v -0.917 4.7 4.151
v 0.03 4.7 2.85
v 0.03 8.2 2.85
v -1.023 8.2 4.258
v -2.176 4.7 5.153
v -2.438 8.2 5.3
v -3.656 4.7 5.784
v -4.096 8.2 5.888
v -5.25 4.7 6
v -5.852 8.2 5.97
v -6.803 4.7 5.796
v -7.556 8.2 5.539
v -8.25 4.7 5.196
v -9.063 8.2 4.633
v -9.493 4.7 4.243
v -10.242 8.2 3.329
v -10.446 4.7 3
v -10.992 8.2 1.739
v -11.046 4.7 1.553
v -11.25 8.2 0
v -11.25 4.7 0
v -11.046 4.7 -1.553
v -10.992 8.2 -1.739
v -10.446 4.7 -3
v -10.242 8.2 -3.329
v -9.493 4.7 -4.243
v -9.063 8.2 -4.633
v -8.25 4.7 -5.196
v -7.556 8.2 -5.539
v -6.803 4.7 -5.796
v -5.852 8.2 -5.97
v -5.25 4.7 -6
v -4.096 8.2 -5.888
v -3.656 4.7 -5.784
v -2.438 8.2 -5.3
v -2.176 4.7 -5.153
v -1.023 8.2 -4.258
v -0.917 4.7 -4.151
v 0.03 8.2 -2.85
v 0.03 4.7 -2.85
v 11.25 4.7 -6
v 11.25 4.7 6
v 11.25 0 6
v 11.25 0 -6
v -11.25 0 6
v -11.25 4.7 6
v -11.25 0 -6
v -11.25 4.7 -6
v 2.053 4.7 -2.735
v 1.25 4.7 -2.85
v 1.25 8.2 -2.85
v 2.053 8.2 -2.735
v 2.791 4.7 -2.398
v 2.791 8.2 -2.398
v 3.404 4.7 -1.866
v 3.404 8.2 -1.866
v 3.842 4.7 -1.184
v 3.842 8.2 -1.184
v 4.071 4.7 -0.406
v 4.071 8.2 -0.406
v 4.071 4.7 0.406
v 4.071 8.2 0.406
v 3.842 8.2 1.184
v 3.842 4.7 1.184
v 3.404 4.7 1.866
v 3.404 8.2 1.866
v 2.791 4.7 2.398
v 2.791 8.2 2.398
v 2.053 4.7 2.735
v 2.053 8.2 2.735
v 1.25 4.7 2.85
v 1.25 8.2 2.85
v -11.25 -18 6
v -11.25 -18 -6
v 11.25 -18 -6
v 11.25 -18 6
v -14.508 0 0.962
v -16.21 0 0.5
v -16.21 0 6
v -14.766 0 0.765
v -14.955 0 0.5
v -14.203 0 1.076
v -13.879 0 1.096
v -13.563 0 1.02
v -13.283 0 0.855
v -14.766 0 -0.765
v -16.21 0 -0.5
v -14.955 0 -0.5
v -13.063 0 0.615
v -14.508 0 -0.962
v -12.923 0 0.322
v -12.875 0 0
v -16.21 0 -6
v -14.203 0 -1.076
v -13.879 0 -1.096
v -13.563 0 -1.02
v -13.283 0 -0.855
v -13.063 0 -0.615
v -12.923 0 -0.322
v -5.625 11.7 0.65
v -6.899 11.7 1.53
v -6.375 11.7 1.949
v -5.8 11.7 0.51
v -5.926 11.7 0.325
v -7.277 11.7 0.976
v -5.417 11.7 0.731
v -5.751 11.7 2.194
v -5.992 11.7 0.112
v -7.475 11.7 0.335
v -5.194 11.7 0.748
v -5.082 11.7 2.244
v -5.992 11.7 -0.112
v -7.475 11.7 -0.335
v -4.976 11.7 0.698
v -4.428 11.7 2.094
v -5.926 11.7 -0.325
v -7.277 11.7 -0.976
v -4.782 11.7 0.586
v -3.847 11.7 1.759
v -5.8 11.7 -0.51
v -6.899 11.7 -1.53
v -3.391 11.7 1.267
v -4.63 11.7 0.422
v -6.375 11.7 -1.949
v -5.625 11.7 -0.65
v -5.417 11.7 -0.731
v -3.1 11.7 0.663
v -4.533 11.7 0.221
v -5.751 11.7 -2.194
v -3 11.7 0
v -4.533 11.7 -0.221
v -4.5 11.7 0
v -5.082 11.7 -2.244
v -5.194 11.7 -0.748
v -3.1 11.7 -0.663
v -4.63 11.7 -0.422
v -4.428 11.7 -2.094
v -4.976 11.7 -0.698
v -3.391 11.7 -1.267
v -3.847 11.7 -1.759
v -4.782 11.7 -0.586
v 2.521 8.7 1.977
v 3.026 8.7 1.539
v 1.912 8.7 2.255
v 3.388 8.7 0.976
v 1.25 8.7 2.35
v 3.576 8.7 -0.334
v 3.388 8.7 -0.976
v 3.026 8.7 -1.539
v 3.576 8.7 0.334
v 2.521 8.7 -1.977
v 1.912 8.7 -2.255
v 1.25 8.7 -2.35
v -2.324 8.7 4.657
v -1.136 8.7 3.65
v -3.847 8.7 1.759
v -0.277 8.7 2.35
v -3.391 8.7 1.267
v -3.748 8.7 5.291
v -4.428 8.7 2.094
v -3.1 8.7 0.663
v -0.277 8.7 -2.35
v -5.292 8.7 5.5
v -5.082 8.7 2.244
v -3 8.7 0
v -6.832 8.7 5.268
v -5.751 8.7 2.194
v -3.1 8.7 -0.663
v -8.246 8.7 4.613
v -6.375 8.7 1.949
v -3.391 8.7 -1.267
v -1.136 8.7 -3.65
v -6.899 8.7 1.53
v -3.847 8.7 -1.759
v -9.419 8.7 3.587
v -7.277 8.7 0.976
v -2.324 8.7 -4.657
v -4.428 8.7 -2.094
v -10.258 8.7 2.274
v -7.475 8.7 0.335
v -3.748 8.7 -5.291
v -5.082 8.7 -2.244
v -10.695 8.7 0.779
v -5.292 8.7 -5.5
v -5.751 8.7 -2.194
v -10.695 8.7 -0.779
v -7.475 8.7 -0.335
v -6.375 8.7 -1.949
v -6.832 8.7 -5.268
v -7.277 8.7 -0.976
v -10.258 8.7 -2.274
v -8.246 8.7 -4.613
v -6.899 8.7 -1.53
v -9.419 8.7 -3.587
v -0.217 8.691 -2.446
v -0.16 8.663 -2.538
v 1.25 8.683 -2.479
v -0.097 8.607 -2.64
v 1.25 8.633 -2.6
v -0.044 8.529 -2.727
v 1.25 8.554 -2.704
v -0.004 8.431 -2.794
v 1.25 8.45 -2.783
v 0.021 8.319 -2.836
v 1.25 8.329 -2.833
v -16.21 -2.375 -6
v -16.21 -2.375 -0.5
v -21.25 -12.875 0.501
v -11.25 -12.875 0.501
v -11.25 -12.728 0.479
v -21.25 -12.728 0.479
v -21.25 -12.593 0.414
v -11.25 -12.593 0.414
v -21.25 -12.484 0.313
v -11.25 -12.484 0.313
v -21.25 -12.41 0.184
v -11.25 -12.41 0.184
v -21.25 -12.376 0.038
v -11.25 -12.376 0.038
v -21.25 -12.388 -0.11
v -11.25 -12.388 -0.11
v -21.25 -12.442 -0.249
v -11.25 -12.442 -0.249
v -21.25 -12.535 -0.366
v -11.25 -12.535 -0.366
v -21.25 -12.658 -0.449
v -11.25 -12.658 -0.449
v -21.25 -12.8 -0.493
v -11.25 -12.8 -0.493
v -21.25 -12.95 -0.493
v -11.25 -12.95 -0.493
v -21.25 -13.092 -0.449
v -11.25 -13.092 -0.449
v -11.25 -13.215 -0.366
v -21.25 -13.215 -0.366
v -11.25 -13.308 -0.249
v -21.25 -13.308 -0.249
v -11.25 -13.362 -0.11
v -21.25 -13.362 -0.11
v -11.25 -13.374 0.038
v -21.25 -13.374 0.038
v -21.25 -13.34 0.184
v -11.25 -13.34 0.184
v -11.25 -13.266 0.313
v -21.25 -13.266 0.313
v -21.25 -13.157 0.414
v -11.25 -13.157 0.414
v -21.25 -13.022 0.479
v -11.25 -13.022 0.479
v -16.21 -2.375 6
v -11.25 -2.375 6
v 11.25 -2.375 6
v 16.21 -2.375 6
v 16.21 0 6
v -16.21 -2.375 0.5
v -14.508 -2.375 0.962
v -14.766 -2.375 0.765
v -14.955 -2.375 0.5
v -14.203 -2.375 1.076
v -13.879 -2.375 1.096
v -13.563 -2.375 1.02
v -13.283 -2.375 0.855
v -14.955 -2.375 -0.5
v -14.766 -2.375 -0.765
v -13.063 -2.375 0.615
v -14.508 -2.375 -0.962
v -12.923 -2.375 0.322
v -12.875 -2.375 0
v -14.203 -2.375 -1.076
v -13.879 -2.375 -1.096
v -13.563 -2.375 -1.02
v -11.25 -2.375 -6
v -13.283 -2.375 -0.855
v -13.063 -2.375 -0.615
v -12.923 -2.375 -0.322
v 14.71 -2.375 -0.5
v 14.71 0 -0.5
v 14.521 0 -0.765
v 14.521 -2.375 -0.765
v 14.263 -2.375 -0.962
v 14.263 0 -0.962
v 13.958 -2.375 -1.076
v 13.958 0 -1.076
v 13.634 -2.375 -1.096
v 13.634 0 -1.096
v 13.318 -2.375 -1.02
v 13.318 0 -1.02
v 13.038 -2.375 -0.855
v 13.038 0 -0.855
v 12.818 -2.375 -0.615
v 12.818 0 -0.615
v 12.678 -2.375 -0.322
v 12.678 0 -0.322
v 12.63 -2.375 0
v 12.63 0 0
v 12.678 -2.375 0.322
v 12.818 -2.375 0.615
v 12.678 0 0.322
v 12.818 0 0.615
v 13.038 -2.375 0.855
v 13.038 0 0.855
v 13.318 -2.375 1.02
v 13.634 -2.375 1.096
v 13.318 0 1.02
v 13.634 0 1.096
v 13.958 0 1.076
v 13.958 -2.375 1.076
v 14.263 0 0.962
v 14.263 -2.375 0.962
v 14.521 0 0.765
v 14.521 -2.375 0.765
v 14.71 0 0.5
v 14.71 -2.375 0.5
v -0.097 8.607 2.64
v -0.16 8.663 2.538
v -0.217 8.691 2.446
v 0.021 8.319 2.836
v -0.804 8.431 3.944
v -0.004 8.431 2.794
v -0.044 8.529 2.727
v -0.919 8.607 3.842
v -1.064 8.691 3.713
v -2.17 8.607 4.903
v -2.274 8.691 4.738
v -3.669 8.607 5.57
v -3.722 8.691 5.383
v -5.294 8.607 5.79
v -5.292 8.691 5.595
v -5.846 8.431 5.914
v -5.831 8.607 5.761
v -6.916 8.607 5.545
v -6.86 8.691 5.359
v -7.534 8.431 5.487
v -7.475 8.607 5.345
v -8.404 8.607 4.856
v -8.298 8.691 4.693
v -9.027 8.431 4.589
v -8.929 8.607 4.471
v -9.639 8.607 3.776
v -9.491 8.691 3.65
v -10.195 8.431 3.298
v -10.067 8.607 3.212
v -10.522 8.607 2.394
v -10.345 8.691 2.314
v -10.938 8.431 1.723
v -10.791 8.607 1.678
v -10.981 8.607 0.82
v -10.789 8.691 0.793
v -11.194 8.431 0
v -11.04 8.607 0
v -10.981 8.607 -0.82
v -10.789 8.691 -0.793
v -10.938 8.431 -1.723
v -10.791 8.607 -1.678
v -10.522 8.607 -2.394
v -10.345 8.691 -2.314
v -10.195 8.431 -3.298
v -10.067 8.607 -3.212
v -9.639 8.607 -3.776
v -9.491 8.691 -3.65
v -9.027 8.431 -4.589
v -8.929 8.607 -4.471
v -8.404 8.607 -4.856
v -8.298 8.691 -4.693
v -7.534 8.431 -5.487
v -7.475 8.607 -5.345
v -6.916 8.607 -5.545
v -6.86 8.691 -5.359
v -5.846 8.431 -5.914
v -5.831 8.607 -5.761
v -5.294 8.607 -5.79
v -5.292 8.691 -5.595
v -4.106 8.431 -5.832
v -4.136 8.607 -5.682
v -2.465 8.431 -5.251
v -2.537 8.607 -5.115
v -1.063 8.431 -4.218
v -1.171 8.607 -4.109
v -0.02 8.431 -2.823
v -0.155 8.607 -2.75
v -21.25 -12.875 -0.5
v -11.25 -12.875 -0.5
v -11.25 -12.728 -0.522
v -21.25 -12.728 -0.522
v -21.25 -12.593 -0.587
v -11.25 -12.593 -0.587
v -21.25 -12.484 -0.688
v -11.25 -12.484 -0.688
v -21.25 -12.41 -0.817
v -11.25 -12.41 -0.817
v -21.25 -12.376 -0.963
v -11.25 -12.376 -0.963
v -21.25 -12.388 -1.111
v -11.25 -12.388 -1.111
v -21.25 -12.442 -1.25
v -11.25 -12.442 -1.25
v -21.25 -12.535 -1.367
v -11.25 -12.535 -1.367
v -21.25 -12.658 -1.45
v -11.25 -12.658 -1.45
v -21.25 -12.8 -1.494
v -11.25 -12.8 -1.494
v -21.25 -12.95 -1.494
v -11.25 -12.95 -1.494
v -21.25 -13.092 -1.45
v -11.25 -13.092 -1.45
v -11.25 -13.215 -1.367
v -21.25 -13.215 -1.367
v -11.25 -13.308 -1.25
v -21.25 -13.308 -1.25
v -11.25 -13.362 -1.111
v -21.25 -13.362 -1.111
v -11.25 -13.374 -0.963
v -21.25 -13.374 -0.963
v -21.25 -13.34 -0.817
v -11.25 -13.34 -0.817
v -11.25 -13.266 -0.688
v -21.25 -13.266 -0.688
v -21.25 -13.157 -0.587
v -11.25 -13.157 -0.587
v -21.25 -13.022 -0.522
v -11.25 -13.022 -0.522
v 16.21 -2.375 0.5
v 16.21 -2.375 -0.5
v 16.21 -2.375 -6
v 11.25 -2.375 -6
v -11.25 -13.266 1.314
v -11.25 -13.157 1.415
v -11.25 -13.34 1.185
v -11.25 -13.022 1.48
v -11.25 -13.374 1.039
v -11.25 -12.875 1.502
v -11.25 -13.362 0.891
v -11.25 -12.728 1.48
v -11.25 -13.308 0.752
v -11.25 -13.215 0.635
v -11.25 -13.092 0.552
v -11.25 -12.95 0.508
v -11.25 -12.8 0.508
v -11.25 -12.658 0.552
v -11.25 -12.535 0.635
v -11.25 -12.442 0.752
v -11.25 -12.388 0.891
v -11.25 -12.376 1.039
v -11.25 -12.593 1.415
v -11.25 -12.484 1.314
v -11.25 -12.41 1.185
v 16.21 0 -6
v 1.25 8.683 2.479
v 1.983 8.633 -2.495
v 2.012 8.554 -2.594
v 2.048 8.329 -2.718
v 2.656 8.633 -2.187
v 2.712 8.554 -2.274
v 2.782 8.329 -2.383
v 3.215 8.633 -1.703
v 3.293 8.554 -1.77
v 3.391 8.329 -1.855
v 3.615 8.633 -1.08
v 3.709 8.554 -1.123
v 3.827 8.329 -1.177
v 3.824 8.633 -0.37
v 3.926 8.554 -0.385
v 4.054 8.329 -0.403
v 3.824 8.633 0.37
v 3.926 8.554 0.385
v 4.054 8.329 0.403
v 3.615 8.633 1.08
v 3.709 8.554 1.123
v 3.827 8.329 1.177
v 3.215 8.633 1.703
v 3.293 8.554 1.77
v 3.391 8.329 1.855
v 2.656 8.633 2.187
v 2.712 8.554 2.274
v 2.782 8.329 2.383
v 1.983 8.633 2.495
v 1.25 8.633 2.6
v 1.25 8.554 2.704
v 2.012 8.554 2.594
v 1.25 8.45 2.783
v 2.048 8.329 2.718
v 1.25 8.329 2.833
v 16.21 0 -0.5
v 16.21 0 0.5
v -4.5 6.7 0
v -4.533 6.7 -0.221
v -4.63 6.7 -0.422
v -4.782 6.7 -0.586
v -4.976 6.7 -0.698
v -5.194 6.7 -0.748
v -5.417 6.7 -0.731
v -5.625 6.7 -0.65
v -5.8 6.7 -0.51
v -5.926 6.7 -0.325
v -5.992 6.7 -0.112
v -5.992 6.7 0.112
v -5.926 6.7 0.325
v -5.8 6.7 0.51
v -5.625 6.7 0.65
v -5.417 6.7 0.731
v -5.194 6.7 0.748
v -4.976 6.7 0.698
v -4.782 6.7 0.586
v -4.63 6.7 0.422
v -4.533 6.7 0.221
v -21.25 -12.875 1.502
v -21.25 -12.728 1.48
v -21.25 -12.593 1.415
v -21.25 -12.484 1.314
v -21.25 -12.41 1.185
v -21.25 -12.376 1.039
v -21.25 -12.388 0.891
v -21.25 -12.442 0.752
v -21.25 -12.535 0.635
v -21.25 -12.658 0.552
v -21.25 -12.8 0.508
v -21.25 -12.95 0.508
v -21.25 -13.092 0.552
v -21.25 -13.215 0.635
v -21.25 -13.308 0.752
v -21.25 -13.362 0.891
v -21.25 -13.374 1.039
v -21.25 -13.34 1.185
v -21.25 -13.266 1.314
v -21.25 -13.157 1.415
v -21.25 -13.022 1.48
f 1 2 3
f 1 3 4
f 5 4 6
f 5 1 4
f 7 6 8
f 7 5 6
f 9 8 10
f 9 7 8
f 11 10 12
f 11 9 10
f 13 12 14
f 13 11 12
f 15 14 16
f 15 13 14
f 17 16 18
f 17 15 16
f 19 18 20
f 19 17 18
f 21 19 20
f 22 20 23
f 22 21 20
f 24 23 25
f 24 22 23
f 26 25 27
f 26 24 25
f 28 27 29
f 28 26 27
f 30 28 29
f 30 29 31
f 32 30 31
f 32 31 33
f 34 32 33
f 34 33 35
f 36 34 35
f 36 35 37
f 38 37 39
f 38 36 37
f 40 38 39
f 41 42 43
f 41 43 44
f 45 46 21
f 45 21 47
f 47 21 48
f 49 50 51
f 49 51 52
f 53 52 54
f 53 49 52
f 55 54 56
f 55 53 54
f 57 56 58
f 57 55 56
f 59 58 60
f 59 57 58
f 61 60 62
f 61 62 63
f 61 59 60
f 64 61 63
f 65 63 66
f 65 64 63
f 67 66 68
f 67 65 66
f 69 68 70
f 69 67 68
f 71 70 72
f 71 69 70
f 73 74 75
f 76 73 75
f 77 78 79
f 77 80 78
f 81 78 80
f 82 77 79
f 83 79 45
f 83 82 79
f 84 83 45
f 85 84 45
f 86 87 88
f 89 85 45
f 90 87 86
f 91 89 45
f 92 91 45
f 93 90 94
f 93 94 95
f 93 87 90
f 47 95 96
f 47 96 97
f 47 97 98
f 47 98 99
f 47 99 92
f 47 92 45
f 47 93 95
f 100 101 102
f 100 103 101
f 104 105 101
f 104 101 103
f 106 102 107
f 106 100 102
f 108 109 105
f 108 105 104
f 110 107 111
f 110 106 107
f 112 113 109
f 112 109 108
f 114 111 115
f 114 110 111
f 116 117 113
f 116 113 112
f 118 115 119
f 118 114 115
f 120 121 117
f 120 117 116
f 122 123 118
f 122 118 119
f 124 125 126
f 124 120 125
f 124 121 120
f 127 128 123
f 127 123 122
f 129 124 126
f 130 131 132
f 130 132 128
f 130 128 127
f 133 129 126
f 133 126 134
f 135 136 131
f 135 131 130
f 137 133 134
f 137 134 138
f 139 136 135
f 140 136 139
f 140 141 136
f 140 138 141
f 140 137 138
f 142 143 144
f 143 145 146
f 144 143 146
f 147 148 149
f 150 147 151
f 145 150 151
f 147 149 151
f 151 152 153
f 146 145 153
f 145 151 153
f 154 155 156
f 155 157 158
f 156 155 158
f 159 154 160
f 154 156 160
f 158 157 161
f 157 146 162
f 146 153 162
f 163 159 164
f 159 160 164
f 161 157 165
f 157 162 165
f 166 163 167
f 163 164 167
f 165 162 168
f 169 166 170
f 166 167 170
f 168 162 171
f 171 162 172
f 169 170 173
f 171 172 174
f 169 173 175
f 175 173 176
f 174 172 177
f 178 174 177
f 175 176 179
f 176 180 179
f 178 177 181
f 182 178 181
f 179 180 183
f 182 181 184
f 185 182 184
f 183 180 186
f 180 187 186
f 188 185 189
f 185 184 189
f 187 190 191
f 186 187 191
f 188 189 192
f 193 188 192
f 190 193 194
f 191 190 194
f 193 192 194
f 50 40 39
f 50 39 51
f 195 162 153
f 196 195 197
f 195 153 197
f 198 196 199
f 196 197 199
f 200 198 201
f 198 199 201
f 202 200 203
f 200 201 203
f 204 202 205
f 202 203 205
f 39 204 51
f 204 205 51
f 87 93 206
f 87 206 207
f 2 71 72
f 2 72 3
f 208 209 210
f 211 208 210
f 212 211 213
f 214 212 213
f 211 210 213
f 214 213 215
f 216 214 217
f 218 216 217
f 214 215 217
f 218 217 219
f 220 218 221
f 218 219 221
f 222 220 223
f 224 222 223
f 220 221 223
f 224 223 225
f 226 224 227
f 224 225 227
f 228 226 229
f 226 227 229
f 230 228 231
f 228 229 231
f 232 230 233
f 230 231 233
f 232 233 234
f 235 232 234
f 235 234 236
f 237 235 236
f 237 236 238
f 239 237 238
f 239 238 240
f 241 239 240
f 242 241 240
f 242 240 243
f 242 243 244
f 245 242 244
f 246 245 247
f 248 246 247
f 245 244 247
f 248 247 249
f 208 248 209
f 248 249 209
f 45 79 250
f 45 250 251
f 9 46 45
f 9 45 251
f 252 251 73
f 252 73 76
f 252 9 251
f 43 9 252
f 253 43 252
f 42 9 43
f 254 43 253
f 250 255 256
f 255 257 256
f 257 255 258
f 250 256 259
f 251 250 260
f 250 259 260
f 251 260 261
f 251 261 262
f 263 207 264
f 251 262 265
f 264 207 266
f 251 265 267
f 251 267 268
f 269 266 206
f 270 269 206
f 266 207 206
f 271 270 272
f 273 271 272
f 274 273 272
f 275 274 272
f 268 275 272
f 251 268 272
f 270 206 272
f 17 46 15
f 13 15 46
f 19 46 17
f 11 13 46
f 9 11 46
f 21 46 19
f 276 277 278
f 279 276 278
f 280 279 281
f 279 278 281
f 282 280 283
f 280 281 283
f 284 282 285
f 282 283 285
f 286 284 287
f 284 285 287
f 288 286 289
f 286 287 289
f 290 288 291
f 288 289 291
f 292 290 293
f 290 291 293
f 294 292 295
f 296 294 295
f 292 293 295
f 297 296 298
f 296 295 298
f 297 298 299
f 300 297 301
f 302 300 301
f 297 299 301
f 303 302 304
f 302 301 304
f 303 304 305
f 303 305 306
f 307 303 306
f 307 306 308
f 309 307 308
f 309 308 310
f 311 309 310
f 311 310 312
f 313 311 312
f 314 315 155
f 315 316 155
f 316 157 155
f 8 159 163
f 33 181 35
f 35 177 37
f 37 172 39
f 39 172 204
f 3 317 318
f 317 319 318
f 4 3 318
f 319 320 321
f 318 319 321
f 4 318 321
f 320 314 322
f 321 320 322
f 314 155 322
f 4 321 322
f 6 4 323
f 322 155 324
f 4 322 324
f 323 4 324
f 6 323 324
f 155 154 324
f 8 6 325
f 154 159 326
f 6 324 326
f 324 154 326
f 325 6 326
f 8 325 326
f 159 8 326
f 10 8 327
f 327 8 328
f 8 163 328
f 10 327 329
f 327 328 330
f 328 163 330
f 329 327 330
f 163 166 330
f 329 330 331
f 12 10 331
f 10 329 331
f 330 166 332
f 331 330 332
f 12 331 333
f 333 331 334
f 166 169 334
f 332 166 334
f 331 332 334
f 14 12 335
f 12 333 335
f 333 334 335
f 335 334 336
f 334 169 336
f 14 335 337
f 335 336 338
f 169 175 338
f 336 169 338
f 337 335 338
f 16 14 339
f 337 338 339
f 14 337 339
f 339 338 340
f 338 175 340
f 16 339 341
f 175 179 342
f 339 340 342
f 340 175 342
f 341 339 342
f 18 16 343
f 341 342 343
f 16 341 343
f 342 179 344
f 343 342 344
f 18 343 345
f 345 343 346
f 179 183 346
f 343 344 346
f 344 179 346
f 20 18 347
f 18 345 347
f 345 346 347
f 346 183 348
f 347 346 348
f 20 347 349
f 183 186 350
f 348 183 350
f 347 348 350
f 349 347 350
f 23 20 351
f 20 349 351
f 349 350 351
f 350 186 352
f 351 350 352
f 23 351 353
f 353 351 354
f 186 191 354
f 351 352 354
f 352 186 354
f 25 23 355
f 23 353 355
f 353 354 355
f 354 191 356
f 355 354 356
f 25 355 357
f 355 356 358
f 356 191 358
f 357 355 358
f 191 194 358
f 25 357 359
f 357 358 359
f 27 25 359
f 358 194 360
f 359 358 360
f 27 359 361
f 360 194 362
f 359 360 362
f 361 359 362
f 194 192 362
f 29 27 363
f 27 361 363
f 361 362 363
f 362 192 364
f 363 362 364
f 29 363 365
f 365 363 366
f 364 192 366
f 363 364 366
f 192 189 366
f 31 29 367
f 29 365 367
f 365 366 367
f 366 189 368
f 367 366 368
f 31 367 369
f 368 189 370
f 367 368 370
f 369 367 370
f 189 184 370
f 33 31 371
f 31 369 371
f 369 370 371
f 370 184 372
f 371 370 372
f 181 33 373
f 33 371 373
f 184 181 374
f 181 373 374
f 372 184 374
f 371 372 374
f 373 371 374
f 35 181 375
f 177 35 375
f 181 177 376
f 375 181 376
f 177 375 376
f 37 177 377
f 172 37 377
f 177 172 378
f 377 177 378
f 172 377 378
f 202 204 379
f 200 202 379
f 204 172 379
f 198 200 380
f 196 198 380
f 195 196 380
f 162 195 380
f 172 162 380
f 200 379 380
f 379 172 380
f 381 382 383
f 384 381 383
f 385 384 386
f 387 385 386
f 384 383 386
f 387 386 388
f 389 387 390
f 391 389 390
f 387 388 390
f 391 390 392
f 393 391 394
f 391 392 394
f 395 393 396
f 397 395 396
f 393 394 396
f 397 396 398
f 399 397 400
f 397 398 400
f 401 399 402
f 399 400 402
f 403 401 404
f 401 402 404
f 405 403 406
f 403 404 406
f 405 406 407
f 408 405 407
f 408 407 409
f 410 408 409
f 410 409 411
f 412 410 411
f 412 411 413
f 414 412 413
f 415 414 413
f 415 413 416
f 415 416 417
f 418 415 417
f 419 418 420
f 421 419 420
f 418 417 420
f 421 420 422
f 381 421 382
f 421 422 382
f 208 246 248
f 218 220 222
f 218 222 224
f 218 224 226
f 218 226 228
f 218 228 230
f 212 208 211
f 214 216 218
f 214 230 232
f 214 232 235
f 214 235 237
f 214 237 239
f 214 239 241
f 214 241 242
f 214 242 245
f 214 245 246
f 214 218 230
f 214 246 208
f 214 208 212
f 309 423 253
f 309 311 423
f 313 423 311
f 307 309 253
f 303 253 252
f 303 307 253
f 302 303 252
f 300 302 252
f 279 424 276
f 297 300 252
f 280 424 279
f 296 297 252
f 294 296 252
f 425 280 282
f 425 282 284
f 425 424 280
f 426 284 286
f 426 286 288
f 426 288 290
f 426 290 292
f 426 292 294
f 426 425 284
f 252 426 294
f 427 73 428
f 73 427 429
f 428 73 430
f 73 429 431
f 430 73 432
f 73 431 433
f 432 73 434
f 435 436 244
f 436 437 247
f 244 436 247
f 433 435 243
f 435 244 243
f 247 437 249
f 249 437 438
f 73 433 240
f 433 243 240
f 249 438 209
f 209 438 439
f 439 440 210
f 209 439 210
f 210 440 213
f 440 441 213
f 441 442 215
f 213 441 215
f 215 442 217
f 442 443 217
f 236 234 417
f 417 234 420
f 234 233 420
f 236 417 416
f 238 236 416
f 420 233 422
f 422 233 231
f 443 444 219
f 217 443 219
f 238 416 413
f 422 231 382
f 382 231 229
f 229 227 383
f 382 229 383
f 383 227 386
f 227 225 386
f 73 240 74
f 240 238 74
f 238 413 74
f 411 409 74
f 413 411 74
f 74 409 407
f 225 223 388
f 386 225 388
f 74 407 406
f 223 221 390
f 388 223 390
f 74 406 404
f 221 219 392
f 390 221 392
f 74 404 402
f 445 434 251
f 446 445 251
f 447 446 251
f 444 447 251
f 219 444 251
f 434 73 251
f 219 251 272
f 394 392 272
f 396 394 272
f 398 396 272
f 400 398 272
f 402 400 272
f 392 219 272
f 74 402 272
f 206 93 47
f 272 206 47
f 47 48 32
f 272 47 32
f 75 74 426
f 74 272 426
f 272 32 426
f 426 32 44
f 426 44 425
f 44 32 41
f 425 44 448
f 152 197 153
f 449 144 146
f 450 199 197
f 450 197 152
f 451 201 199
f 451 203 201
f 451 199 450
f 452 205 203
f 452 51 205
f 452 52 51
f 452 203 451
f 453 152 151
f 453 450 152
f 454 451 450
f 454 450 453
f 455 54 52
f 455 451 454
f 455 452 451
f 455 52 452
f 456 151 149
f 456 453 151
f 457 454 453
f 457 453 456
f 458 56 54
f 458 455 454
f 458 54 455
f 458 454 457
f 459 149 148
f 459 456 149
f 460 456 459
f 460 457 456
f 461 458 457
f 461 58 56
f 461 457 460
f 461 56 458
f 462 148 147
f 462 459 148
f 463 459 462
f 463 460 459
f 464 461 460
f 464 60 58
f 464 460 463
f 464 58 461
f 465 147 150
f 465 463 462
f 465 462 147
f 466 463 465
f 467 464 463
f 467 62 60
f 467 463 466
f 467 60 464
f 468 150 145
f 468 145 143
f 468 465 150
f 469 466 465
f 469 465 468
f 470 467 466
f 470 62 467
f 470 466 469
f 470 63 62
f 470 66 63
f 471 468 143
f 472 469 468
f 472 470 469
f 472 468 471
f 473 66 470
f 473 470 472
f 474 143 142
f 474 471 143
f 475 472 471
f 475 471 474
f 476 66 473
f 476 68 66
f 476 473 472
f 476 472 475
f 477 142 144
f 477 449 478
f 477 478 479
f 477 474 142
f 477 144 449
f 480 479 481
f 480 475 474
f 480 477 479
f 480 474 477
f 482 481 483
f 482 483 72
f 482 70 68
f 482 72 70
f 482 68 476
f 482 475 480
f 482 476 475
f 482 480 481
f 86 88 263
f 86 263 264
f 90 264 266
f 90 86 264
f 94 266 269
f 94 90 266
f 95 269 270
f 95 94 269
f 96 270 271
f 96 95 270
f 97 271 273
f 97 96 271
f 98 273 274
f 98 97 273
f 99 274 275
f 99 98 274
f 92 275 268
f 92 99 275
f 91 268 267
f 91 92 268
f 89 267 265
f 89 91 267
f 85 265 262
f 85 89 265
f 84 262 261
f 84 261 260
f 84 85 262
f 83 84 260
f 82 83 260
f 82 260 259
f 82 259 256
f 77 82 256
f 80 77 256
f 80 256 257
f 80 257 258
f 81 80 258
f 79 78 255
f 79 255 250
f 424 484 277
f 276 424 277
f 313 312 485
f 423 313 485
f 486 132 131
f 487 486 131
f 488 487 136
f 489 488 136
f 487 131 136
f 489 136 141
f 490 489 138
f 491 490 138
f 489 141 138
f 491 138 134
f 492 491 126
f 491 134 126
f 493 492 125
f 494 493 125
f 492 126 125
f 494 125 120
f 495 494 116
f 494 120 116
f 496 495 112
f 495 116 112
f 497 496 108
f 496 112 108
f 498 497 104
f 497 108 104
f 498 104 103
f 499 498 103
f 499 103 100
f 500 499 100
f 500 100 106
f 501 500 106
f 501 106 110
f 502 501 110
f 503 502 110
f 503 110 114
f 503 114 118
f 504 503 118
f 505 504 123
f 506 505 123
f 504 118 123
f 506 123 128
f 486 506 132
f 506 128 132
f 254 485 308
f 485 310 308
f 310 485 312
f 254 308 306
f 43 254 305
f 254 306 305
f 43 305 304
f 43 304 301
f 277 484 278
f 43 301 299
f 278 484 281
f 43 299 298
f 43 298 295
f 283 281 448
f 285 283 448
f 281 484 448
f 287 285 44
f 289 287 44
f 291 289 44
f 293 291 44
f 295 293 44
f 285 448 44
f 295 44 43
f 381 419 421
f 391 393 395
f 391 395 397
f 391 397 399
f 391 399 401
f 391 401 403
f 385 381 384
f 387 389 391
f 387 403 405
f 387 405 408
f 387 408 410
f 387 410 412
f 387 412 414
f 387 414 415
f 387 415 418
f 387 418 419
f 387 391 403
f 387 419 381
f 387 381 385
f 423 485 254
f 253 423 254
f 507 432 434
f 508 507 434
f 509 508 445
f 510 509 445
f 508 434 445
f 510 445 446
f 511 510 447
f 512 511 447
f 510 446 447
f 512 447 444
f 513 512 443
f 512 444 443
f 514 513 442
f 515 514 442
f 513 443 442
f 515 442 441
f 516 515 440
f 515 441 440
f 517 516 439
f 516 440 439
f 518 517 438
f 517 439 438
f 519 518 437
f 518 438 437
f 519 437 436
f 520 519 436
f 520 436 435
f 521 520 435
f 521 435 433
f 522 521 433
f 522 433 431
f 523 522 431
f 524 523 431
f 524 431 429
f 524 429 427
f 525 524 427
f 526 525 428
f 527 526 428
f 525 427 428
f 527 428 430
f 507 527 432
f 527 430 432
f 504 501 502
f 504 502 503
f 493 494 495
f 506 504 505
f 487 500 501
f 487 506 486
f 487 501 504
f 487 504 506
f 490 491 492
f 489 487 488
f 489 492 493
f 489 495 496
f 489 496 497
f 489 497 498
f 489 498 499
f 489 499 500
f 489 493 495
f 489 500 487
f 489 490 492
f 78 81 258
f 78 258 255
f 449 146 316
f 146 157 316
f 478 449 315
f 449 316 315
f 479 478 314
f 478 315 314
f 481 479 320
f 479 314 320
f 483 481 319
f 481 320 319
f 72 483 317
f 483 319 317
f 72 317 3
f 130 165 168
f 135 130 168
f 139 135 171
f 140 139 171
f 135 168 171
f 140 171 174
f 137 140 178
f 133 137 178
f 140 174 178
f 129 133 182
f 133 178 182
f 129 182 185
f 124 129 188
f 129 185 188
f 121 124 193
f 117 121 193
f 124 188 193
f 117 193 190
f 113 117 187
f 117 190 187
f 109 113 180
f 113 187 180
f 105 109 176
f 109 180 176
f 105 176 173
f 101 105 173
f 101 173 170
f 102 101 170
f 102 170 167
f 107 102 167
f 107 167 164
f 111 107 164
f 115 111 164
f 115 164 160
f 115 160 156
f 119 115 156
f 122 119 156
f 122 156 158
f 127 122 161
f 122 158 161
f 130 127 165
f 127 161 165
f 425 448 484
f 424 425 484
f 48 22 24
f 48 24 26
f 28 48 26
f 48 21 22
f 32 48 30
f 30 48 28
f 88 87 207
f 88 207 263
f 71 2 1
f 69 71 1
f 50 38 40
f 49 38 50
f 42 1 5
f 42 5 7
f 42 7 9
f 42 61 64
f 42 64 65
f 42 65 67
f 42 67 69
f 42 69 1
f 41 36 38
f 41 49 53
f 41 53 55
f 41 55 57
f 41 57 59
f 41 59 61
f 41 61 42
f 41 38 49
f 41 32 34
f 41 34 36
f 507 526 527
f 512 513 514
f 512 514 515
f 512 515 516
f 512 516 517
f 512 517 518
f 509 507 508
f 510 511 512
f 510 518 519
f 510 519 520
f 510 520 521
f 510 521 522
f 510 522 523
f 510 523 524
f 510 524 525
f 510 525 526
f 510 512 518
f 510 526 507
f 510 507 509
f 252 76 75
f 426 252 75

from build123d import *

# Parameters (mm, degrees)
BODY_DEPTH             = 4.7
BODY_DEPTH_BACK        = 18
ESBO_O1_W              = 22.5
ESBO_O1_H              = 12
TABS_DEPTH             = 2.375
TOP_GEAR_HOUSING_DEPTH = 4
ESBO_O4_R              = 2.25
SHAFT_DEPTH            = 3
ESBO_O5_R              = 0.75
SHAFT_HOLE_DEPTH       = 5
FILETE2_R              = 0.5
SKETCH1_R              = 0.5
BOSS_EXTRUDE1_DEPTH    = 10
LPATTERN2_COUNT        = 3
LPATTERN2_PITCH        = 1.001


with BuildPart() as part:
    # Esboço1 → Body (new, two sides: drawn at the far end of the back side and taken through both)
    with BuildSketch(Plane(origin=(0, 0, 0), x_dir=(1, 0, 0), z_dir=(0, 1, 0)).offset(-BODY_DEPTH_BACK)):
        Rectangle(ESBO_O1_W, ESBO_O1_H)
    extrude(amount=BODY_DEPTH + BODY_DEPTH_BACK)

    # Esboço2 → tabs (add)
    with BuildSketch(Plane(origin=(0, 0, 0), x_dir=(1, 0, 0), z_dir=(0, 1, 0))):
        with BuildLine():
            Line((-11.25, 6), (-16.21, 6))
            Line((-16.21, 6), (-16.21, 0.5))
            Line((-16.21, 0.5), (-14.954795897, 0.5))
            ThreePointArc((-14.954795897, 0.5), (-12.875, 0), (-14.954795897, -0.5))
            Line((-14.954795897, -0.5), (-16.21, -0.5))
            Line((-16.21, -0.5), (-16.21, -6))
            Line((-16.21, -6), (-11.25, -6))
            Line((-11.25, -6), (-11.25, 6))
        make_face()
        with BuildLine():
            Line((11.25, 6), (16.21, 6))
            Line((16.21, 6), (16.21, 0.5))
            Line((16.21, 0.5), (14.709795897, 0.5))
            ThreePointArc((14.709795897, 0.5), (12.63, 0), (14.709795897, -0.5))
            Line((14.709795897, -0.5), (16.21, -0.5))
            Line((16.21, -0.5), (16.21, -6))
            Line((16.21, -6), (11.25, -6))
            Line((11.25, -6), (11.25, 6))
        make_face()
    extrude(amount=-TABS_DEPTH)

    # Esboço3 → Top Gear Housing (add)
    with BuildSketch(Plane(origin=(0, 4.7, 0), x_dir=(1, 0, 0), z_dir=(0, 1, 0))):
        with BuildLine():
            Line((0.029914772, 2.85), (1.25, 2.85))
            ThreePointArc((1.25, 2.85), (4.1, 0), (1.25, -2.85))
            Line((1.25, -2.85), (0.029914772, -2.85))
            ThreePointArc((0.029914772, -2.85), (-11.25, 0), (0.029914772, 2.85))
        make_face()
    extrude(amount=TOP_GEAR_HOUSING_DEPTH)

    # Esboço4 → shaft (add)
    with BuildSketch(Plane(origin=(0, 8.7, 0), x_dir=(1, 0, 0), z_dir=(0, 1, 0))):
        with Locations((-5.25, 0)):
            Circle(ESBO_O4_R)
    extrude(amount=SHAFT_DEPTH)

    # Esboço5 → shaft hole (cut)
    with BuildSketch(Plane(origin=(0, 11.7, 0), x_dir=(1, 0, 0), z_dir=(0, 1, 0))):
        with Locations((-5.25, 0)):
            Circle(ESBO_O5_R)
    extrude(amount=-SHAFT_HOLE_DEPTH, mode=Mode.SUBTRACT)

    # Filete2
    filete2_edges = [part.edges().sort_by_distance(p)[0] for p in [
        (0.639957386, 8.7, 2.85),
        (0.639957386, 8.7, -2.85),
        (4.1, 8.7, 0),
        (-11.25, 8.7, 0),
    ]]
    fillet(filete2_edges, radius=FILETE2_R)

    # Sketch1 → Boss-Extrude1 (add)
    with BuildSketch(Plane.ZY.offset(11.25)):
        with Locations((-1, -12.875)):
            Circle(SKETCH1_R)
    boss_extrude1 = extrude(amount=BOSS_EXTRUDE1_DEPTH)

    # LPattern2: Boss-Extrude1 ×3
    with Locations(*[(0, 0, i * LPATTERN2_PITCH) for i in range(1, LPATTERN2_COUNT)]):
        add(boss_extrude1)


solid = part.part
